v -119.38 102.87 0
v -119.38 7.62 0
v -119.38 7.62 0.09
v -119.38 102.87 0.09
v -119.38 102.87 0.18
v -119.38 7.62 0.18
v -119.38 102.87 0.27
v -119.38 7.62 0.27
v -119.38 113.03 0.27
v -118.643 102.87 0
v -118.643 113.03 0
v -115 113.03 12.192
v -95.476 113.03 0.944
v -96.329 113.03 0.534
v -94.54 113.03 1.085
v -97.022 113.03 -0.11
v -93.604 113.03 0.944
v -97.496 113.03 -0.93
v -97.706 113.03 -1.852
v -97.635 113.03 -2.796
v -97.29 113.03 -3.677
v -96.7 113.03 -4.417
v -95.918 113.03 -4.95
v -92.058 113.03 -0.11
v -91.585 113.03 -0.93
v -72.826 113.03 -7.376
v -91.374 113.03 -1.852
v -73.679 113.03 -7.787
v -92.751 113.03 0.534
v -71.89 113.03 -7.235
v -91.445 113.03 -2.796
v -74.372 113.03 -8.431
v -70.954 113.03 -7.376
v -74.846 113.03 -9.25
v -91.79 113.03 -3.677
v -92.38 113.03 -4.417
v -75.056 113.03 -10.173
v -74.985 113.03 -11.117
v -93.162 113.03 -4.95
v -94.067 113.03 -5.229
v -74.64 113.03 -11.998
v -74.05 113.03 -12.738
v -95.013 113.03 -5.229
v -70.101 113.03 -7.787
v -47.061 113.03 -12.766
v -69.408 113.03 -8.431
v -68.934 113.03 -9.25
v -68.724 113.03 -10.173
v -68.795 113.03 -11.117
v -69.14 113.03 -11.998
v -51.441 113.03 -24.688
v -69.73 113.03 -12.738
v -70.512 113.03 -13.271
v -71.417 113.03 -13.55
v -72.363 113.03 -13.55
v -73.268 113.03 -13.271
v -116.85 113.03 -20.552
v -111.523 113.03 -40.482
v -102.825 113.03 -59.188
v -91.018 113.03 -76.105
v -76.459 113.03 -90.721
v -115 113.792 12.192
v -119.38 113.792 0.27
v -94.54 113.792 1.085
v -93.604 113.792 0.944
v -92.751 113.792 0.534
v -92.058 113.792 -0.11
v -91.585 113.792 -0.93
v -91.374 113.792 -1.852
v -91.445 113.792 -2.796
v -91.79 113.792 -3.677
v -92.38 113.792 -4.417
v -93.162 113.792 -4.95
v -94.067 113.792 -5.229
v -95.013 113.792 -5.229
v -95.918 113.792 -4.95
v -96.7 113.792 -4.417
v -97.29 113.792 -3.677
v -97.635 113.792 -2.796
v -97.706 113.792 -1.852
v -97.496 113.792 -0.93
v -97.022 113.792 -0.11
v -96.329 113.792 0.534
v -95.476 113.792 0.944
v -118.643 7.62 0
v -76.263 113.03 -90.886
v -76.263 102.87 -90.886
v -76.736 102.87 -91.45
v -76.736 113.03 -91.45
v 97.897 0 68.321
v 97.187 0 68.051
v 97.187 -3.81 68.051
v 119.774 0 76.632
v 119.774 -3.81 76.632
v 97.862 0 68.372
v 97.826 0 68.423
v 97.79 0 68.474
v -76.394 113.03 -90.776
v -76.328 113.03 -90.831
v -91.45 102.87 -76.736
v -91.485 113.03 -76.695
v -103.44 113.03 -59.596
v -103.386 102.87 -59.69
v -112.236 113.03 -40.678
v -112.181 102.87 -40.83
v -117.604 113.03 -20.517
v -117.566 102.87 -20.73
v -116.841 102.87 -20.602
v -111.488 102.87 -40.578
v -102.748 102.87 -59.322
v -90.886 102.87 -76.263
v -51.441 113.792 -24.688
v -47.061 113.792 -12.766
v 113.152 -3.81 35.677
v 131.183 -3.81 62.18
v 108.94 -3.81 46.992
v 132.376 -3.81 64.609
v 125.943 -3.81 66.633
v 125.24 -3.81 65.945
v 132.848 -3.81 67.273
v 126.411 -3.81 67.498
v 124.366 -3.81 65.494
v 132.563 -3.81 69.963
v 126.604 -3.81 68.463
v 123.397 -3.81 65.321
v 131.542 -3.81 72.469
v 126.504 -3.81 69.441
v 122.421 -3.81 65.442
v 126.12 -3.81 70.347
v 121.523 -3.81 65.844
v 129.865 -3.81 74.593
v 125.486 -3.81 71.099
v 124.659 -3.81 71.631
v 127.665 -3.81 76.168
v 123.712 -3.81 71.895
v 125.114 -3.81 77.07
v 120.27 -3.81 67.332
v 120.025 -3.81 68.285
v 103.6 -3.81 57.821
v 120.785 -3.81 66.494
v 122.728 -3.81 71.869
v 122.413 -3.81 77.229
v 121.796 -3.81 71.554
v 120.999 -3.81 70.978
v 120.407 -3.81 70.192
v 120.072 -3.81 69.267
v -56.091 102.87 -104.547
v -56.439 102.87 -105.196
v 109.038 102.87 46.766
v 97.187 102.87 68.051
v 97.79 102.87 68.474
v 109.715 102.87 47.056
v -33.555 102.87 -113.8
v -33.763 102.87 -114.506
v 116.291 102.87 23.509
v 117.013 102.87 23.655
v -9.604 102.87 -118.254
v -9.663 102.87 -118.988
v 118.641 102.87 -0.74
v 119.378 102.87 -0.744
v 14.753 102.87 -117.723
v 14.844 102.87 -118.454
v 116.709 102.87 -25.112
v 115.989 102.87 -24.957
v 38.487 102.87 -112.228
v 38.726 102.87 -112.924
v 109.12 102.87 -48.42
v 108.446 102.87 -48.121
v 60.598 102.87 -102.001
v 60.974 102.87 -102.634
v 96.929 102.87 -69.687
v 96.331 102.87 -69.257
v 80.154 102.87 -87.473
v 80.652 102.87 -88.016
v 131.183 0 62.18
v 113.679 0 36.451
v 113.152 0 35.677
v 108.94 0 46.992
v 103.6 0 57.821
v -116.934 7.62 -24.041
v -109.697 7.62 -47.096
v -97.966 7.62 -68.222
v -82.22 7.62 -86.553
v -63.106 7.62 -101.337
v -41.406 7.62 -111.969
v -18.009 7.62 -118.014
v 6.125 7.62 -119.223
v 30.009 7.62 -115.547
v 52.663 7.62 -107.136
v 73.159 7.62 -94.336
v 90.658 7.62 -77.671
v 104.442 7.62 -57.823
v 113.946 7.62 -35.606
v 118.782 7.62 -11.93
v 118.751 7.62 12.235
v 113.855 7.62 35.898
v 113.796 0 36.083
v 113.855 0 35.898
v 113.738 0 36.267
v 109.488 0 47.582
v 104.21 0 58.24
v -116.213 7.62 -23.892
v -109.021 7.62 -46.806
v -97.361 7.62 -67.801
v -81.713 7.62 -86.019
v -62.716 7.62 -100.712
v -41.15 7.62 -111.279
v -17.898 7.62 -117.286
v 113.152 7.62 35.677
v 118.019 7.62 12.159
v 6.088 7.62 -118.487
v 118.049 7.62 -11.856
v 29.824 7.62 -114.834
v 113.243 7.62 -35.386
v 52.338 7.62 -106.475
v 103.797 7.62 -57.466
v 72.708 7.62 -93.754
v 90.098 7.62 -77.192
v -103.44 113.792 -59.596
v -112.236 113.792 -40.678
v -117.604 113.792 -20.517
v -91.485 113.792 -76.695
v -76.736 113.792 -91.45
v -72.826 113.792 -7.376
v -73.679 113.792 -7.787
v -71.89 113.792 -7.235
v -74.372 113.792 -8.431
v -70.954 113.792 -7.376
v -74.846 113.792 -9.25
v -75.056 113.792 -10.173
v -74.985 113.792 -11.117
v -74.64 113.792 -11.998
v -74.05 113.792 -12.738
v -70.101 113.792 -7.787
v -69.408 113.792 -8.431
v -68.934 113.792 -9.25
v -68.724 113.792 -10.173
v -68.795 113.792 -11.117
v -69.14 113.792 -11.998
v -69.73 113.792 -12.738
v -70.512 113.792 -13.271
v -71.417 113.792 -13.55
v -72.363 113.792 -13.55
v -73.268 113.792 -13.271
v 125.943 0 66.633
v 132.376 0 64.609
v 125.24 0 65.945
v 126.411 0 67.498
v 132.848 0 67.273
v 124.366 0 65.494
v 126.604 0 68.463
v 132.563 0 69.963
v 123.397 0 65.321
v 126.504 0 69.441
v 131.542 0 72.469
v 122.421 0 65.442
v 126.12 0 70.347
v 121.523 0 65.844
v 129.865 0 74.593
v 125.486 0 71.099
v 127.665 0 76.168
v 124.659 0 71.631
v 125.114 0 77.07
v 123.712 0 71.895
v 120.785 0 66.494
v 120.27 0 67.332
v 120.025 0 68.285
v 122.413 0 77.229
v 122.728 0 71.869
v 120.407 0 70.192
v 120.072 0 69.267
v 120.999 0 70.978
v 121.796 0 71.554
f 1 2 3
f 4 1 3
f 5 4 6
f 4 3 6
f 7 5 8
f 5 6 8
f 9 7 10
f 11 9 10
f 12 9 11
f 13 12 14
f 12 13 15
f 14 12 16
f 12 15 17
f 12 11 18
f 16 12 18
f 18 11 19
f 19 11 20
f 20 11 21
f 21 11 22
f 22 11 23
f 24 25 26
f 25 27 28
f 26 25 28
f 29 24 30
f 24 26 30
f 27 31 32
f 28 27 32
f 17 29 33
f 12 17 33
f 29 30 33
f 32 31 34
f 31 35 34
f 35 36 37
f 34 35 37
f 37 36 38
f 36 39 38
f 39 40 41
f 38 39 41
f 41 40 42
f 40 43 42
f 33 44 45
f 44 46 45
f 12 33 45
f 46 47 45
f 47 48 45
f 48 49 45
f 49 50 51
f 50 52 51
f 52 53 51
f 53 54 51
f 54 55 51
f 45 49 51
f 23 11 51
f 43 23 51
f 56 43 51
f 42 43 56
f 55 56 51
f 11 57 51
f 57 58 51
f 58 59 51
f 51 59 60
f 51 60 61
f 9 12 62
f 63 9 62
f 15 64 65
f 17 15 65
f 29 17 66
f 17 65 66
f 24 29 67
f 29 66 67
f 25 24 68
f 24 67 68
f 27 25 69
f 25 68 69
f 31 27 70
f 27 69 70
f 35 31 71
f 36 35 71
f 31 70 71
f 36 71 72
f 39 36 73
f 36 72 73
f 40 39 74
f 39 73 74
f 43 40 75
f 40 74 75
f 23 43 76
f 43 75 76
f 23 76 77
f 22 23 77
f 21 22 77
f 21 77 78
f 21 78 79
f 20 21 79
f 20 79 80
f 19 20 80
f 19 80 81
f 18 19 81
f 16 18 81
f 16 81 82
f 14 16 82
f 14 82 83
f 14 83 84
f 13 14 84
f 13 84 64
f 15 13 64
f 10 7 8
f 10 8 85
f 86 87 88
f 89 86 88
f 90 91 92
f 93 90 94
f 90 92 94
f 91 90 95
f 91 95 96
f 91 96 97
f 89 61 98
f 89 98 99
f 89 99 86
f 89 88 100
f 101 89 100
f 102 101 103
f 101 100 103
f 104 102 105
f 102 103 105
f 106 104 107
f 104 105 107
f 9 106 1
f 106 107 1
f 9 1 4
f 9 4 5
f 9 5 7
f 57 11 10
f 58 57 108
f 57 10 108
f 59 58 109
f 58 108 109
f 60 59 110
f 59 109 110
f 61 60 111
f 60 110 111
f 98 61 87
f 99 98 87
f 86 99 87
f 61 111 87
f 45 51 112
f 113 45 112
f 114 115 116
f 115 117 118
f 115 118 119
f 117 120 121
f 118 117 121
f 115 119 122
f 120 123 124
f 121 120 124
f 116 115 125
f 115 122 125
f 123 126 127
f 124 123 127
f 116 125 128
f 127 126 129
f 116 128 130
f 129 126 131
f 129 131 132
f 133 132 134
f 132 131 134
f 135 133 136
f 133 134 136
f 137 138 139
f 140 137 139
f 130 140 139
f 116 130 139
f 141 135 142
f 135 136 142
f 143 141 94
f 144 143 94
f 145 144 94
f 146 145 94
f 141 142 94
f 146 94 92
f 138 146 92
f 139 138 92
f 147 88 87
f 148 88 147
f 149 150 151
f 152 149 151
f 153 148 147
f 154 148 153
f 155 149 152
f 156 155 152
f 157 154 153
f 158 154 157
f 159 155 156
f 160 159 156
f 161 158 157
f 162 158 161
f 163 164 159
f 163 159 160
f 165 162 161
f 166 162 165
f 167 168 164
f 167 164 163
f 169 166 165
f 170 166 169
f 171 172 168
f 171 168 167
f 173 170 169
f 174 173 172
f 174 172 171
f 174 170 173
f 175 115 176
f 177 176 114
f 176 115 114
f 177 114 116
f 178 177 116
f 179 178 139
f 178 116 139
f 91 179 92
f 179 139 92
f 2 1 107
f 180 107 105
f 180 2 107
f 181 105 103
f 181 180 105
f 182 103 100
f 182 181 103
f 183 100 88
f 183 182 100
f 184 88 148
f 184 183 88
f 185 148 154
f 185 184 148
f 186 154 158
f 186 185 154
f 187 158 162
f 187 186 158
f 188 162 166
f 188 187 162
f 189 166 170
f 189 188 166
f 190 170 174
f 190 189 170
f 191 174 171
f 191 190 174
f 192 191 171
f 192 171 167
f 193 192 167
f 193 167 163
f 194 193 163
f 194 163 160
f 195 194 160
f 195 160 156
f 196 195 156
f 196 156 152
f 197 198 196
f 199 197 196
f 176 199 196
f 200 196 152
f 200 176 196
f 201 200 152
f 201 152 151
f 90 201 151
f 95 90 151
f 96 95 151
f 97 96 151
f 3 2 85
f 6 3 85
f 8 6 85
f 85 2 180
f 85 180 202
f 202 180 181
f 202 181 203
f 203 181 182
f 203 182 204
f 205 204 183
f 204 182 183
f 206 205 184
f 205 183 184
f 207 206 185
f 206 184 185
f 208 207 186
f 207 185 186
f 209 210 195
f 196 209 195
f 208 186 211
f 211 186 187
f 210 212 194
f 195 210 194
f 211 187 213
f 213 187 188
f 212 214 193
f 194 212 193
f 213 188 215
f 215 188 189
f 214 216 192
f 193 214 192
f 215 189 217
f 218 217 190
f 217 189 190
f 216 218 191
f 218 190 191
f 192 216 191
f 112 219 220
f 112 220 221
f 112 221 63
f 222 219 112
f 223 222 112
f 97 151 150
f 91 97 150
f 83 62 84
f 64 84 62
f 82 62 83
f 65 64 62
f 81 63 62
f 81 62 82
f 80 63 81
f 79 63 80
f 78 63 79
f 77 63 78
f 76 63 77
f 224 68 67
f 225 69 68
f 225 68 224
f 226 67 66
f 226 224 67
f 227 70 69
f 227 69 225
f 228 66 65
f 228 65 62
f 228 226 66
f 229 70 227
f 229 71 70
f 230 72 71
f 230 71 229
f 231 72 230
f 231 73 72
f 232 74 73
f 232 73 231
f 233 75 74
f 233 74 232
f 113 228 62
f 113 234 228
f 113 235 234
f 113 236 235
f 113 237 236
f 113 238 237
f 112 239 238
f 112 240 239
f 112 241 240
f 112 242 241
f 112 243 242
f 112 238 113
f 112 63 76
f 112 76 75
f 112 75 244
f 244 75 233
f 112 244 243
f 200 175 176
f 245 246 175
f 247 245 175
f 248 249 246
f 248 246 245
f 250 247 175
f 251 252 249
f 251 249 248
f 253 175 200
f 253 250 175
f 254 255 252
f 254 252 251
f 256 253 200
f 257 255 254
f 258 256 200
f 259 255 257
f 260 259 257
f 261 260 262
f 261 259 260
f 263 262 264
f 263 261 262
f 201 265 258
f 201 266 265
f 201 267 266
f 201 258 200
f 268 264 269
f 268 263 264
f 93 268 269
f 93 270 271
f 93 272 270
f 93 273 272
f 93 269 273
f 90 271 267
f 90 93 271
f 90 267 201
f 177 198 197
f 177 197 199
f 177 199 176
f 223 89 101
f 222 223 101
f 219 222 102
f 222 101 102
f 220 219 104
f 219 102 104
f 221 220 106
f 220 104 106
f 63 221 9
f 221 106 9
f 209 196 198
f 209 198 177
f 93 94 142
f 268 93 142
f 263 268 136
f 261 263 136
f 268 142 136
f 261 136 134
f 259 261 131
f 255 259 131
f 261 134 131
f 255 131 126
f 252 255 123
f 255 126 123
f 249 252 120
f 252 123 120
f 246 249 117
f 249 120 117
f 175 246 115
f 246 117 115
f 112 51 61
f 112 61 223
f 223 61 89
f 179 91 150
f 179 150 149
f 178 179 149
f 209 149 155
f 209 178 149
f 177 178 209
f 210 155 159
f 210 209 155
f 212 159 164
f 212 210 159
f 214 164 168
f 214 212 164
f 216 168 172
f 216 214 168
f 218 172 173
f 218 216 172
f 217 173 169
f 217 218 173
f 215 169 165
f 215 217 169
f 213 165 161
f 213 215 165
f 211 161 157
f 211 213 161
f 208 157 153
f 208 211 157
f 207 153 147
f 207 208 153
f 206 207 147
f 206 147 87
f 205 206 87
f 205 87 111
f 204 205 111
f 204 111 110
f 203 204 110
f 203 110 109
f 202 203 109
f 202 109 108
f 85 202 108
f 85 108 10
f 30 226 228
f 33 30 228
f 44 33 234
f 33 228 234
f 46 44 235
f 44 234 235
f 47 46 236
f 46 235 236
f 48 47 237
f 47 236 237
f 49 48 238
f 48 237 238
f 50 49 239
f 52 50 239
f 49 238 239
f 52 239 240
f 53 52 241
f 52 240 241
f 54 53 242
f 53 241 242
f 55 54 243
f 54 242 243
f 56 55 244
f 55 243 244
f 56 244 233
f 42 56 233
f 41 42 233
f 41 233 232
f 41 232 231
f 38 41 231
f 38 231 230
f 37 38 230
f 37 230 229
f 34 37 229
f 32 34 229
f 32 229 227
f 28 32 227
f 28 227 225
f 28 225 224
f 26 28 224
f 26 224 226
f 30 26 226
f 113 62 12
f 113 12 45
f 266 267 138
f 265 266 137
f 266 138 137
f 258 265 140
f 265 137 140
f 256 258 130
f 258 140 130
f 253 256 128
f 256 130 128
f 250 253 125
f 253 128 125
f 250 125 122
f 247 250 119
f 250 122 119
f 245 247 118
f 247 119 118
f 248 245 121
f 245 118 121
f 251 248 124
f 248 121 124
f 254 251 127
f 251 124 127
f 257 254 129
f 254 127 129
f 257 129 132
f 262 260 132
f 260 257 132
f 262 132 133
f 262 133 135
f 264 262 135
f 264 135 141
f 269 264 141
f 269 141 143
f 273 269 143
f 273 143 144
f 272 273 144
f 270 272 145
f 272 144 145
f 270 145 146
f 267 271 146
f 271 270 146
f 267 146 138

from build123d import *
from build123d.topology import SkipClean

# Parameters (mm, degrees)
BASE_FLANGE1_DEPTH  = 102.87
CUT_EXTRUDE1_START  = -7.62
CUT_EXTRUDE1_DEPTH  = 7.62
BOSS_EXTRUDE5_START = -95.25
BOSS_EXTRUDE5_DEPTH = 95.25
BOSS_EXTRUDE6_DEPTH = 10.16
BOSS_EXTRUDE7_DEPTH = 0.762
SKETCH12_W          = 72.378245623
SKETCH12_H          = 0.762
BOSS_EXTRUDE8_DEPTH = 12.7
SKETCH13_R          = 3.175
CUT_EXTRUDE2_DEPTH  = 204.597121983
BOSS_EXTRUDE9_START = 3.81
BOSS_EXTRUDE9_DEPTH = 3.81


# Read off the part's stored shape, not the designer's step: Cut-Extrude1
# Sheet-metal steps are written as plain solids
with BuildPart() as part:
    # Sketch2 → Base-Flange1 (new body)
    with BuildSketch(Plane(origin=(0, 0, 0), x_dir=(1, 0, 0), z_dir=(0, 1, 0))):
        with BuildLine():
            ThreePointArc((-119.38, 0), (35.898258345, 113.85472958), (97.790371047, -68.473554972))
            Line((97.790371047, -68.473554972), (97.186983651, -68.051058569))
            ThreePointArc((97.186983651, -68.051058569), (35.676758453, 113.152221674), (-118.6434, 0))
            Line((-118.6434, 0), (-119.38, 0))
        make_face()
    extrude(amount=BASE_FLANGE1_DEPTH)

    # Cut-Extrude1 outline → Cut-Extrude1 (cut)
    with BuildSketch(Plane.XZ.offset(CUT_EXTRUDE1_START)):
        with BuildLine():
            ThreePointArc((-119.38, 0), (18.160489843, -117.990597119), (113.85472958, 35.898258345))
            Line((113.85472958, 35.898258345), (113.152221674, 35.676758453))
            ThreePointArc((113.152221674, 35.676758453), (18.048435757, -117.262570031), (-118.6434, 0))
            Line((-118.6434, 0), (-119.38, 0))
        make_face()
    extrude(amount=CUT_EXTRUDE1_DEPTH, mode=Mode.SUBTRACT)

    # Sketch9 → Boss-Extrude5 (add)
    with BuildSketch(Plane(origin=(0, 102.87, 0), x_dir=(1, 0, 0), z_dir=(0, 1, 0)).offset(BOSS_EXTRUDE5_START)):
        with BuildLine():
            Line((-119.379693576, -0.270484204), (-118.6434, 0))
            Line((-118.6434, 0), (-119.38, 0))
            ThreePointArc((-119.38, 0), (-119.379923394, -0.135242189), (-119.379693576, -0.270484204))
        make_face()
    extrude(amount=BOSS_EXTRUDE5_DEPTH)

    # Sketch10 → Boss-Extrude6 (add)
    with SkipClean():  # the faces are left unmerged after this step: merging them gives an invalid solid
        with BuildSketch(Plane(origin=(0, 102.87, 0), x_dir=(1, 0, 0), z_dir=(0, 1, 0))):
            with BuildLine():
                Line((-119.379693576, -0.270484204), (-118.6434, 0))
                ThreePointArc((-118.6434, 0), (-107.527437301, 50.140867475), (-76.262507491, 90.886117283))
                Line((-76.262507491, 90.886117283), (-76.735984844, 91.45038562))
                ThreePointArc((-76.735984844, 91.45038562), (-108.252110006, 50.329564663), (-119.379693576, -0.270484204))
            make_face()
        extrude(amount=BOSS_EXTRUDE6_DEPTH)

    # Sketch11 → Boss-Extrude7 (add)
    with SkipClean():  # the faces are left unmerged after this step: merging them gives an invalid solid
        with BuildSketch(Plane(origin=(0, 113.03, 0), x_dir=(1, 0, 0), z_dir=(0, 1, 0))):
            with BuildLine():
                Line((-119.379693576, -0.270484204), (-51.440692331, 24.687531528))
                Line((-51.440692331, 24.687531528), (-76.735984844, 91.45038562))
                ThreePointArc((-76.735984844, 91.45038562), (-108.252110006, 50.329564663), (-119.379693576, -0.270484204))
            make_face()
        extrude(amount=BOSS_EXTRUDE7_DEPTH)

    # Sketch12 → Boss-Extrude8 (add)
    with SkipClean():  # the faces are left unmerged after this step: merging them gives an invalid solid
        with BuildSketch(Plane(origin=(-14.107419738, 0, -38.402251904), x_dir=(0.9386660406079884, 0, -0.3448275862069655), z_dir=(0.3448275862069655, 0, 0.9386660406079884))):
            with Locations((-75.961811901, 113.411)):
                Rectangle(SKETCH12_W, SKETCH12_H)
        extrude(amount=BOSS_EXTRUDE8_DEPTH)

    # Sketch13 → Cut-Extrude2 (cut, through all)
    with SkipClean():  # the faces are left unmerged after this step: merging them gives an invalid solid
        with BuildSketch(Plane(origin=(0, 113.792, 0), x_dir=(1, 0, 0), z_dir=(0, 1, 0))):
            with Locations(Location((-94.540026844, 2.089676094, 0), (0, 0, 270))):
                Circle(SKETCH13_R)
            with Locations(Location((-71.890015284, 10.410365749, 0), (0, 0, 270))):
                Circle(SKETCH13_R)
        extrude(amount=-CUT_EXTRUDE2_DEPTH, mode=Mode.SUBTRACT)

    # Sketch14 → Boss-Extrude9 (add)
    with SkipClean():  # the faces are left unmerged after this step: merging them gives an invalid solid
        with BuildSketch(Plane.XZ.offset(BOSS_EXTRUDE9_START)):
            with BuildLine():
                Line((97.186983651, 68.051058569), (119.774310511, 76.632245246))
                ThreePointArc((119.774310511, 76.632245246), (130.778139327, 73.589906503), (131.18256886, 62.180414385))
                Line((131.18256886, 62.180414385), (113.152221674, 35.676758453))
                ThreePointArc((113.152221674, 35.676758453), (106.408031423, 52.474633989), (97.186983651, 68.051058569))
            make_face()
            with BuildLine():
                ThreePointArc((126.590987662, 68.955600398), (122.972686098, 71.90312373), (120.025162766, 68.284822166))
                ThreePointArc((120.025162766, 68.284822166), (123.64346433, 65.337298834), (126.590987662, 68.955600398))
            make_face(mode=Mode.SUBTRACT)
        extrude(amount=-BOSS_EXTRUDE9_DEPTH)


solid = part.part
